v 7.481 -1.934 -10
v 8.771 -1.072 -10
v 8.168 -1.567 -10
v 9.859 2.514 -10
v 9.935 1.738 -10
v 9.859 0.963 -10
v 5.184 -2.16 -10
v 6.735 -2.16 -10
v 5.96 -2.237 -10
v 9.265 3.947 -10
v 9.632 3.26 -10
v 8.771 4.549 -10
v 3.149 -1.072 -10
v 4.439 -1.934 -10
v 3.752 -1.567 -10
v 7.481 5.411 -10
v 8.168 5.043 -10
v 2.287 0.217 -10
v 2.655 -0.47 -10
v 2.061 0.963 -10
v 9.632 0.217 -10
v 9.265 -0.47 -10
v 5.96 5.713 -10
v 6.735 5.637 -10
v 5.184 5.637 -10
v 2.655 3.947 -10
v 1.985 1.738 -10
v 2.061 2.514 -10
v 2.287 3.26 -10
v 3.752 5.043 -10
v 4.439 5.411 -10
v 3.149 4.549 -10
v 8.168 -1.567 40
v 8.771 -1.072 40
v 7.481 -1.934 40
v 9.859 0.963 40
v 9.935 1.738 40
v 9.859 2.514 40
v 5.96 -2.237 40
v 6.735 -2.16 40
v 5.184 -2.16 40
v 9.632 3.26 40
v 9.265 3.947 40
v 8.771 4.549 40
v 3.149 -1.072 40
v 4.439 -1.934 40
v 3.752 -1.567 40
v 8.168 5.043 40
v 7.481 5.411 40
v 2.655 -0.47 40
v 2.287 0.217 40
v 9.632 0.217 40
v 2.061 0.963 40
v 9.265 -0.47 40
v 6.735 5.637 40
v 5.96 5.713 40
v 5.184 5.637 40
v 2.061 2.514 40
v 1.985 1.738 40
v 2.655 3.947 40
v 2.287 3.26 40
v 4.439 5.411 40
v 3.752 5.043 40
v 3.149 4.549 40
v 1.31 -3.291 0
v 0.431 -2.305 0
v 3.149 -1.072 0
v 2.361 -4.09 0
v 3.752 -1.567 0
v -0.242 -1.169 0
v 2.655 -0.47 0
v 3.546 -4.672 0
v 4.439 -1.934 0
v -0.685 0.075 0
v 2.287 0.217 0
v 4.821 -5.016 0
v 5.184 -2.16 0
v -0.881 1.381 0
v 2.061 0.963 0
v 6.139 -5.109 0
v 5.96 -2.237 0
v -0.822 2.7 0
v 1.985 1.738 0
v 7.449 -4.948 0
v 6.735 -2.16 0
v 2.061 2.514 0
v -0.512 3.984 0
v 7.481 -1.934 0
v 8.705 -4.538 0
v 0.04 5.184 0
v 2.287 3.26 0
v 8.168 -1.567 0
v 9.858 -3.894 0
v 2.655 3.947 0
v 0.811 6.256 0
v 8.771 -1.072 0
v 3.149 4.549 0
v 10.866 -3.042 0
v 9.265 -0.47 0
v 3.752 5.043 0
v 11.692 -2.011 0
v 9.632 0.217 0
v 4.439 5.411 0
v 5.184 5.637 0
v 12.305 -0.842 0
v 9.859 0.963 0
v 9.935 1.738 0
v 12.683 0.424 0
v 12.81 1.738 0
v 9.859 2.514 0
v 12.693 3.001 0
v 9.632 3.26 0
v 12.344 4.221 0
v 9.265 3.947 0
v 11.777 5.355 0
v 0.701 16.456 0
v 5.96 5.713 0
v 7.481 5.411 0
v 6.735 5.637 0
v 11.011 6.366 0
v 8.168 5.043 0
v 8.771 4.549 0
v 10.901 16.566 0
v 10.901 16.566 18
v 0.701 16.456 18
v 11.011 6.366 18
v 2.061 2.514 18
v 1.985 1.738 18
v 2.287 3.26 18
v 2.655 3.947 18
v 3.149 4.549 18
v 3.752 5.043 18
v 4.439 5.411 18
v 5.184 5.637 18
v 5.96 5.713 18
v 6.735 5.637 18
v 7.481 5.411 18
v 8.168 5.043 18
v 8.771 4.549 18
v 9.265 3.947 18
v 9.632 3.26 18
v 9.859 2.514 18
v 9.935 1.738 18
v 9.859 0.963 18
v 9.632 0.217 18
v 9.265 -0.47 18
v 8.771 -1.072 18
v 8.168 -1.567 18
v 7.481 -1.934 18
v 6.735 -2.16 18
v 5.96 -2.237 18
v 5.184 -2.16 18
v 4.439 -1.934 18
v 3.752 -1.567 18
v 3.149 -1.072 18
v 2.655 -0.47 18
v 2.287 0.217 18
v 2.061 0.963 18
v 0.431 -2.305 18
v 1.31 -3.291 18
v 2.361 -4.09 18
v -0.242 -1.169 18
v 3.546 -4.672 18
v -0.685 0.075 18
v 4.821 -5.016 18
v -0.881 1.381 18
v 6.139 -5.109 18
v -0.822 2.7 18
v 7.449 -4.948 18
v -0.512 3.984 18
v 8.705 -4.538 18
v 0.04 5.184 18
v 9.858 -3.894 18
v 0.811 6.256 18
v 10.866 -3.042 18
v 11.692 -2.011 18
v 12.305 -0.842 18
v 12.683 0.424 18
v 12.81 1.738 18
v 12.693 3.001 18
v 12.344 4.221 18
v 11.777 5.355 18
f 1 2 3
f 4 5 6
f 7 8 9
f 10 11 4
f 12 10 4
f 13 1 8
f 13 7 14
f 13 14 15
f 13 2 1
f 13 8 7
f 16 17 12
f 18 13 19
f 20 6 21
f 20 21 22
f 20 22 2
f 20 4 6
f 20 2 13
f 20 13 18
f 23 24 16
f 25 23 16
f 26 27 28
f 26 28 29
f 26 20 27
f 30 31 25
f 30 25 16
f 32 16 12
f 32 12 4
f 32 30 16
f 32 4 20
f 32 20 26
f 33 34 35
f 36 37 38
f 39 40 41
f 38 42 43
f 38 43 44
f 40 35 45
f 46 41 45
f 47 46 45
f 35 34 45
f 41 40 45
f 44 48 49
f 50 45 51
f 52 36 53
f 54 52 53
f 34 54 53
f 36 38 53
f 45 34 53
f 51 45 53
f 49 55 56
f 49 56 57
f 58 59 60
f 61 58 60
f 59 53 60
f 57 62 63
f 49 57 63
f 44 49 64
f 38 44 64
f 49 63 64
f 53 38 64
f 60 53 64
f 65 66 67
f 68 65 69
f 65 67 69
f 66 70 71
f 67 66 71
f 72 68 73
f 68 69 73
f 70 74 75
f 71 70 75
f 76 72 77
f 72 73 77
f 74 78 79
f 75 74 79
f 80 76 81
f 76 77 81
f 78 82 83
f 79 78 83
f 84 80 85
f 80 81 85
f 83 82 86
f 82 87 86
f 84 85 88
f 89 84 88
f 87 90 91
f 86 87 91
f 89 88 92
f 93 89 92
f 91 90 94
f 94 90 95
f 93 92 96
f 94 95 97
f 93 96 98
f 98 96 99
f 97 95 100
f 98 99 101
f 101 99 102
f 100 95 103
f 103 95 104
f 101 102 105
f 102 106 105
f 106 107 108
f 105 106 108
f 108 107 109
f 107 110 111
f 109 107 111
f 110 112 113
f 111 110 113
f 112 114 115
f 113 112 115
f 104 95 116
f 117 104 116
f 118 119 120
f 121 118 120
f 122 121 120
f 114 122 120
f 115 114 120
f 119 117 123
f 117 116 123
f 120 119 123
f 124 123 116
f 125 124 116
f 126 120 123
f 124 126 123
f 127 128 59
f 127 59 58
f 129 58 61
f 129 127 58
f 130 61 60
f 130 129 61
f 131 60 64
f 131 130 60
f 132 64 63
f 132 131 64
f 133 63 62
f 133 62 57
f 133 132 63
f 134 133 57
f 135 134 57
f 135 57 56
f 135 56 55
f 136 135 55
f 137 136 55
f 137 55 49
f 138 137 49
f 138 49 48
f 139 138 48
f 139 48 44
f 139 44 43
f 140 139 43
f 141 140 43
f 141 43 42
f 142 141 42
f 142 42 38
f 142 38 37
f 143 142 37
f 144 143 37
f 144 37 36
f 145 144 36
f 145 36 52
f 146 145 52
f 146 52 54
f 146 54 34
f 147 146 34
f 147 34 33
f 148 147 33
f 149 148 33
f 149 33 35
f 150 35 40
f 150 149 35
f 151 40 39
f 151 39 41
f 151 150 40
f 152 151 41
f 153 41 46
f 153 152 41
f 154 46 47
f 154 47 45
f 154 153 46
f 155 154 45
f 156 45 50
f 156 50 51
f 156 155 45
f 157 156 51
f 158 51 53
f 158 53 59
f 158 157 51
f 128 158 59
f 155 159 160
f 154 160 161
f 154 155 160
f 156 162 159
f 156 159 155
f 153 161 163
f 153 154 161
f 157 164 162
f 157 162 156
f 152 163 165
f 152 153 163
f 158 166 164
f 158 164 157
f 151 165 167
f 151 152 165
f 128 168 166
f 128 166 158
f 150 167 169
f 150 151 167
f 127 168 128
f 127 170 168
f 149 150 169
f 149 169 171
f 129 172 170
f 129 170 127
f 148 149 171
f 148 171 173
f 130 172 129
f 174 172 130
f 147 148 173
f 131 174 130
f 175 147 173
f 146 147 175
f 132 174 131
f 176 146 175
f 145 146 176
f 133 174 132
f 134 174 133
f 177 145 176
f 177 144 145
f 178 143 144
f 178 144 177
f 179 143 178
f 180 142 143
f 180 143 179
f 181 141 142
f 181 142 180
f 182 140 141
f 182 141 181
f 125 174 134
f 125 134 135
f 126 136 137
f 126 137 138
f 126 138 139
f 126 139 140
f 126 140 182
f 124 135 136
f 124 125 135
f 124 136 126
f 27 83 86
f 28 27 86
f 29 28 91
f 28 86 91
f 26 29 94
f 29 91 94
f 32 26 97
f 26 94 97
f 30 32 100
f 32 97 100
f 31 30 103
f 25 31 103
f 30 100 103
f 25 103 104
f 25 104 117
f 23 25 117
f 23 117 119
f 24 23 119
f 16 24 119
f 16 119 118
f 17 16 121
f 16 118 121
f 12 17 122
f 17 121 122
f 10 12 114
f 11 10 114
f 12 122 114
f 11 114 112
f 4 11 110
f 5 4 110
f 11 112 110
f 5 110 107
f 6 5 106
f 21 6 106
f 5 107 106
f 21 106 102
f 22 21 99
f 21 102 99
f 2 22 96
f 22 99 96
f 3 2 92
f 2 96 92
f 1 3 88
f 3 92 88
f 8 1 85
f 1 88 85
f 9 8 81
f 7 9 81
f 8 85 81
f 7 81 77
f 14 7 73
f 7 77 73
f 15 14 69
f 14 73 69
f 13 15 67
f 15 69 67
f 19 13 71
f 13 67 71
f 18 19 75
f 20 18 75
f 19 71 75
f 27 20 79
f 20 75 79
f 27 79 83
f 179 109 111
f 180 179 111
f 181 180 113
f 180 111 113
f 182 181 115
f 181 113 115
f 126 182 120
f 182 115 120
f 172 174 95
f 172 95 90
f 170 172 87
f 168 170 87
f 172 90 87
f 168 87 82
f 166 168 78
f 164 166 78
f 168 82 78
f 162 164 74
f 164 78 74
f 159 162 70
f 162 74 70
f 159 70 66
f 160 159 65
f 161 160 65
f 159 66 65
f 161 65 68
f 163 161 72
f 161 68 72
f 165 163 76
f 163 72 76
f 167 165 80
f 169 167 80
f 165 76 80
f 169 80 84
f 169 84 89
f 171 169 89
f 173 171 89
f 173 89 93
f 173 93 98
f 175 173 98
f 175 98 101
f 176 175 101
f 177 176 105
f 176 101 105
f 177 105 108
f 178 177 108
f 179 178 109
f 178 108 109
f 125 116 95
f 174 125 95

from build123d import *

# Parameters (mm, degrees)
BOSS_EXTRUDE1_DEPTH      = 18
SKETCH4_R                = 3.975
BOSS_EXTRUDE2_DEPTH      = 10
BOSS_EXTRUDE2_DEPTH_BACK = 40


with BuildPart() as part:
    # Sketch1 → Boss-Extrude1 (new body)
    with BuildSketch(Plane.XY):
        with BuildLine():
            Line((0.700840098, 16.455896919), (0.810681557, 6.255896919))
            ThreePointArc((0.810681557, 6.255896919), (5.886159138, 8.587996721), (11.010681557, 6.365738378))
            Line((11.010681557, 6.365738378), (10.900840098, 16.565738378))
            Line((10.900840098, 16.565738378), (0.700840098, 16.455896919))
        make_face()
        with BuildLine():
            ThreePointArc((11.010681557, 6.365738378), (5.886159138, 8.587996721), (0.810681557, 6.255896919))
            Line((0.810681557, 6.255896919), (11.010681557, 6.365738378))
        make_face()
        with BuildLine():
            Line((11.010681557, 6.365738378), (0.810681557, 6.255896919))
            ThreePointArc((0.810681557, 6.255896919), (3.546395485, -4.672331118), (12.809920939, 1.738393871))
            ThreePointArc((12.809920939, 1.738393871), (12.344285051, 4.220811017), (11.010681557, 6.365738378))
        make_face()
    extrude(amount=BOSS_EXTRUDE1_DEPTH)

    # Sketch4 → Boss-Extrude2 (add, two sides)
    with BuildSketch(Plane(origin=(0, 0, 0), x_dir=(-1, 0, 0), z_dir=(0, 0, -1))) as boss_extrude2_sk:
        with Locations((-5.959920939, 1.738393871)):
            Circle(SKETCH4_R)
    extrude(amount=BOSS_EXTRUDE2_DEPTH)
    extrude(boss_extrude2_sk.sketch, amount=-BOSS_EXTRUDE2_DEPTH_BACK)


solid = part.part
